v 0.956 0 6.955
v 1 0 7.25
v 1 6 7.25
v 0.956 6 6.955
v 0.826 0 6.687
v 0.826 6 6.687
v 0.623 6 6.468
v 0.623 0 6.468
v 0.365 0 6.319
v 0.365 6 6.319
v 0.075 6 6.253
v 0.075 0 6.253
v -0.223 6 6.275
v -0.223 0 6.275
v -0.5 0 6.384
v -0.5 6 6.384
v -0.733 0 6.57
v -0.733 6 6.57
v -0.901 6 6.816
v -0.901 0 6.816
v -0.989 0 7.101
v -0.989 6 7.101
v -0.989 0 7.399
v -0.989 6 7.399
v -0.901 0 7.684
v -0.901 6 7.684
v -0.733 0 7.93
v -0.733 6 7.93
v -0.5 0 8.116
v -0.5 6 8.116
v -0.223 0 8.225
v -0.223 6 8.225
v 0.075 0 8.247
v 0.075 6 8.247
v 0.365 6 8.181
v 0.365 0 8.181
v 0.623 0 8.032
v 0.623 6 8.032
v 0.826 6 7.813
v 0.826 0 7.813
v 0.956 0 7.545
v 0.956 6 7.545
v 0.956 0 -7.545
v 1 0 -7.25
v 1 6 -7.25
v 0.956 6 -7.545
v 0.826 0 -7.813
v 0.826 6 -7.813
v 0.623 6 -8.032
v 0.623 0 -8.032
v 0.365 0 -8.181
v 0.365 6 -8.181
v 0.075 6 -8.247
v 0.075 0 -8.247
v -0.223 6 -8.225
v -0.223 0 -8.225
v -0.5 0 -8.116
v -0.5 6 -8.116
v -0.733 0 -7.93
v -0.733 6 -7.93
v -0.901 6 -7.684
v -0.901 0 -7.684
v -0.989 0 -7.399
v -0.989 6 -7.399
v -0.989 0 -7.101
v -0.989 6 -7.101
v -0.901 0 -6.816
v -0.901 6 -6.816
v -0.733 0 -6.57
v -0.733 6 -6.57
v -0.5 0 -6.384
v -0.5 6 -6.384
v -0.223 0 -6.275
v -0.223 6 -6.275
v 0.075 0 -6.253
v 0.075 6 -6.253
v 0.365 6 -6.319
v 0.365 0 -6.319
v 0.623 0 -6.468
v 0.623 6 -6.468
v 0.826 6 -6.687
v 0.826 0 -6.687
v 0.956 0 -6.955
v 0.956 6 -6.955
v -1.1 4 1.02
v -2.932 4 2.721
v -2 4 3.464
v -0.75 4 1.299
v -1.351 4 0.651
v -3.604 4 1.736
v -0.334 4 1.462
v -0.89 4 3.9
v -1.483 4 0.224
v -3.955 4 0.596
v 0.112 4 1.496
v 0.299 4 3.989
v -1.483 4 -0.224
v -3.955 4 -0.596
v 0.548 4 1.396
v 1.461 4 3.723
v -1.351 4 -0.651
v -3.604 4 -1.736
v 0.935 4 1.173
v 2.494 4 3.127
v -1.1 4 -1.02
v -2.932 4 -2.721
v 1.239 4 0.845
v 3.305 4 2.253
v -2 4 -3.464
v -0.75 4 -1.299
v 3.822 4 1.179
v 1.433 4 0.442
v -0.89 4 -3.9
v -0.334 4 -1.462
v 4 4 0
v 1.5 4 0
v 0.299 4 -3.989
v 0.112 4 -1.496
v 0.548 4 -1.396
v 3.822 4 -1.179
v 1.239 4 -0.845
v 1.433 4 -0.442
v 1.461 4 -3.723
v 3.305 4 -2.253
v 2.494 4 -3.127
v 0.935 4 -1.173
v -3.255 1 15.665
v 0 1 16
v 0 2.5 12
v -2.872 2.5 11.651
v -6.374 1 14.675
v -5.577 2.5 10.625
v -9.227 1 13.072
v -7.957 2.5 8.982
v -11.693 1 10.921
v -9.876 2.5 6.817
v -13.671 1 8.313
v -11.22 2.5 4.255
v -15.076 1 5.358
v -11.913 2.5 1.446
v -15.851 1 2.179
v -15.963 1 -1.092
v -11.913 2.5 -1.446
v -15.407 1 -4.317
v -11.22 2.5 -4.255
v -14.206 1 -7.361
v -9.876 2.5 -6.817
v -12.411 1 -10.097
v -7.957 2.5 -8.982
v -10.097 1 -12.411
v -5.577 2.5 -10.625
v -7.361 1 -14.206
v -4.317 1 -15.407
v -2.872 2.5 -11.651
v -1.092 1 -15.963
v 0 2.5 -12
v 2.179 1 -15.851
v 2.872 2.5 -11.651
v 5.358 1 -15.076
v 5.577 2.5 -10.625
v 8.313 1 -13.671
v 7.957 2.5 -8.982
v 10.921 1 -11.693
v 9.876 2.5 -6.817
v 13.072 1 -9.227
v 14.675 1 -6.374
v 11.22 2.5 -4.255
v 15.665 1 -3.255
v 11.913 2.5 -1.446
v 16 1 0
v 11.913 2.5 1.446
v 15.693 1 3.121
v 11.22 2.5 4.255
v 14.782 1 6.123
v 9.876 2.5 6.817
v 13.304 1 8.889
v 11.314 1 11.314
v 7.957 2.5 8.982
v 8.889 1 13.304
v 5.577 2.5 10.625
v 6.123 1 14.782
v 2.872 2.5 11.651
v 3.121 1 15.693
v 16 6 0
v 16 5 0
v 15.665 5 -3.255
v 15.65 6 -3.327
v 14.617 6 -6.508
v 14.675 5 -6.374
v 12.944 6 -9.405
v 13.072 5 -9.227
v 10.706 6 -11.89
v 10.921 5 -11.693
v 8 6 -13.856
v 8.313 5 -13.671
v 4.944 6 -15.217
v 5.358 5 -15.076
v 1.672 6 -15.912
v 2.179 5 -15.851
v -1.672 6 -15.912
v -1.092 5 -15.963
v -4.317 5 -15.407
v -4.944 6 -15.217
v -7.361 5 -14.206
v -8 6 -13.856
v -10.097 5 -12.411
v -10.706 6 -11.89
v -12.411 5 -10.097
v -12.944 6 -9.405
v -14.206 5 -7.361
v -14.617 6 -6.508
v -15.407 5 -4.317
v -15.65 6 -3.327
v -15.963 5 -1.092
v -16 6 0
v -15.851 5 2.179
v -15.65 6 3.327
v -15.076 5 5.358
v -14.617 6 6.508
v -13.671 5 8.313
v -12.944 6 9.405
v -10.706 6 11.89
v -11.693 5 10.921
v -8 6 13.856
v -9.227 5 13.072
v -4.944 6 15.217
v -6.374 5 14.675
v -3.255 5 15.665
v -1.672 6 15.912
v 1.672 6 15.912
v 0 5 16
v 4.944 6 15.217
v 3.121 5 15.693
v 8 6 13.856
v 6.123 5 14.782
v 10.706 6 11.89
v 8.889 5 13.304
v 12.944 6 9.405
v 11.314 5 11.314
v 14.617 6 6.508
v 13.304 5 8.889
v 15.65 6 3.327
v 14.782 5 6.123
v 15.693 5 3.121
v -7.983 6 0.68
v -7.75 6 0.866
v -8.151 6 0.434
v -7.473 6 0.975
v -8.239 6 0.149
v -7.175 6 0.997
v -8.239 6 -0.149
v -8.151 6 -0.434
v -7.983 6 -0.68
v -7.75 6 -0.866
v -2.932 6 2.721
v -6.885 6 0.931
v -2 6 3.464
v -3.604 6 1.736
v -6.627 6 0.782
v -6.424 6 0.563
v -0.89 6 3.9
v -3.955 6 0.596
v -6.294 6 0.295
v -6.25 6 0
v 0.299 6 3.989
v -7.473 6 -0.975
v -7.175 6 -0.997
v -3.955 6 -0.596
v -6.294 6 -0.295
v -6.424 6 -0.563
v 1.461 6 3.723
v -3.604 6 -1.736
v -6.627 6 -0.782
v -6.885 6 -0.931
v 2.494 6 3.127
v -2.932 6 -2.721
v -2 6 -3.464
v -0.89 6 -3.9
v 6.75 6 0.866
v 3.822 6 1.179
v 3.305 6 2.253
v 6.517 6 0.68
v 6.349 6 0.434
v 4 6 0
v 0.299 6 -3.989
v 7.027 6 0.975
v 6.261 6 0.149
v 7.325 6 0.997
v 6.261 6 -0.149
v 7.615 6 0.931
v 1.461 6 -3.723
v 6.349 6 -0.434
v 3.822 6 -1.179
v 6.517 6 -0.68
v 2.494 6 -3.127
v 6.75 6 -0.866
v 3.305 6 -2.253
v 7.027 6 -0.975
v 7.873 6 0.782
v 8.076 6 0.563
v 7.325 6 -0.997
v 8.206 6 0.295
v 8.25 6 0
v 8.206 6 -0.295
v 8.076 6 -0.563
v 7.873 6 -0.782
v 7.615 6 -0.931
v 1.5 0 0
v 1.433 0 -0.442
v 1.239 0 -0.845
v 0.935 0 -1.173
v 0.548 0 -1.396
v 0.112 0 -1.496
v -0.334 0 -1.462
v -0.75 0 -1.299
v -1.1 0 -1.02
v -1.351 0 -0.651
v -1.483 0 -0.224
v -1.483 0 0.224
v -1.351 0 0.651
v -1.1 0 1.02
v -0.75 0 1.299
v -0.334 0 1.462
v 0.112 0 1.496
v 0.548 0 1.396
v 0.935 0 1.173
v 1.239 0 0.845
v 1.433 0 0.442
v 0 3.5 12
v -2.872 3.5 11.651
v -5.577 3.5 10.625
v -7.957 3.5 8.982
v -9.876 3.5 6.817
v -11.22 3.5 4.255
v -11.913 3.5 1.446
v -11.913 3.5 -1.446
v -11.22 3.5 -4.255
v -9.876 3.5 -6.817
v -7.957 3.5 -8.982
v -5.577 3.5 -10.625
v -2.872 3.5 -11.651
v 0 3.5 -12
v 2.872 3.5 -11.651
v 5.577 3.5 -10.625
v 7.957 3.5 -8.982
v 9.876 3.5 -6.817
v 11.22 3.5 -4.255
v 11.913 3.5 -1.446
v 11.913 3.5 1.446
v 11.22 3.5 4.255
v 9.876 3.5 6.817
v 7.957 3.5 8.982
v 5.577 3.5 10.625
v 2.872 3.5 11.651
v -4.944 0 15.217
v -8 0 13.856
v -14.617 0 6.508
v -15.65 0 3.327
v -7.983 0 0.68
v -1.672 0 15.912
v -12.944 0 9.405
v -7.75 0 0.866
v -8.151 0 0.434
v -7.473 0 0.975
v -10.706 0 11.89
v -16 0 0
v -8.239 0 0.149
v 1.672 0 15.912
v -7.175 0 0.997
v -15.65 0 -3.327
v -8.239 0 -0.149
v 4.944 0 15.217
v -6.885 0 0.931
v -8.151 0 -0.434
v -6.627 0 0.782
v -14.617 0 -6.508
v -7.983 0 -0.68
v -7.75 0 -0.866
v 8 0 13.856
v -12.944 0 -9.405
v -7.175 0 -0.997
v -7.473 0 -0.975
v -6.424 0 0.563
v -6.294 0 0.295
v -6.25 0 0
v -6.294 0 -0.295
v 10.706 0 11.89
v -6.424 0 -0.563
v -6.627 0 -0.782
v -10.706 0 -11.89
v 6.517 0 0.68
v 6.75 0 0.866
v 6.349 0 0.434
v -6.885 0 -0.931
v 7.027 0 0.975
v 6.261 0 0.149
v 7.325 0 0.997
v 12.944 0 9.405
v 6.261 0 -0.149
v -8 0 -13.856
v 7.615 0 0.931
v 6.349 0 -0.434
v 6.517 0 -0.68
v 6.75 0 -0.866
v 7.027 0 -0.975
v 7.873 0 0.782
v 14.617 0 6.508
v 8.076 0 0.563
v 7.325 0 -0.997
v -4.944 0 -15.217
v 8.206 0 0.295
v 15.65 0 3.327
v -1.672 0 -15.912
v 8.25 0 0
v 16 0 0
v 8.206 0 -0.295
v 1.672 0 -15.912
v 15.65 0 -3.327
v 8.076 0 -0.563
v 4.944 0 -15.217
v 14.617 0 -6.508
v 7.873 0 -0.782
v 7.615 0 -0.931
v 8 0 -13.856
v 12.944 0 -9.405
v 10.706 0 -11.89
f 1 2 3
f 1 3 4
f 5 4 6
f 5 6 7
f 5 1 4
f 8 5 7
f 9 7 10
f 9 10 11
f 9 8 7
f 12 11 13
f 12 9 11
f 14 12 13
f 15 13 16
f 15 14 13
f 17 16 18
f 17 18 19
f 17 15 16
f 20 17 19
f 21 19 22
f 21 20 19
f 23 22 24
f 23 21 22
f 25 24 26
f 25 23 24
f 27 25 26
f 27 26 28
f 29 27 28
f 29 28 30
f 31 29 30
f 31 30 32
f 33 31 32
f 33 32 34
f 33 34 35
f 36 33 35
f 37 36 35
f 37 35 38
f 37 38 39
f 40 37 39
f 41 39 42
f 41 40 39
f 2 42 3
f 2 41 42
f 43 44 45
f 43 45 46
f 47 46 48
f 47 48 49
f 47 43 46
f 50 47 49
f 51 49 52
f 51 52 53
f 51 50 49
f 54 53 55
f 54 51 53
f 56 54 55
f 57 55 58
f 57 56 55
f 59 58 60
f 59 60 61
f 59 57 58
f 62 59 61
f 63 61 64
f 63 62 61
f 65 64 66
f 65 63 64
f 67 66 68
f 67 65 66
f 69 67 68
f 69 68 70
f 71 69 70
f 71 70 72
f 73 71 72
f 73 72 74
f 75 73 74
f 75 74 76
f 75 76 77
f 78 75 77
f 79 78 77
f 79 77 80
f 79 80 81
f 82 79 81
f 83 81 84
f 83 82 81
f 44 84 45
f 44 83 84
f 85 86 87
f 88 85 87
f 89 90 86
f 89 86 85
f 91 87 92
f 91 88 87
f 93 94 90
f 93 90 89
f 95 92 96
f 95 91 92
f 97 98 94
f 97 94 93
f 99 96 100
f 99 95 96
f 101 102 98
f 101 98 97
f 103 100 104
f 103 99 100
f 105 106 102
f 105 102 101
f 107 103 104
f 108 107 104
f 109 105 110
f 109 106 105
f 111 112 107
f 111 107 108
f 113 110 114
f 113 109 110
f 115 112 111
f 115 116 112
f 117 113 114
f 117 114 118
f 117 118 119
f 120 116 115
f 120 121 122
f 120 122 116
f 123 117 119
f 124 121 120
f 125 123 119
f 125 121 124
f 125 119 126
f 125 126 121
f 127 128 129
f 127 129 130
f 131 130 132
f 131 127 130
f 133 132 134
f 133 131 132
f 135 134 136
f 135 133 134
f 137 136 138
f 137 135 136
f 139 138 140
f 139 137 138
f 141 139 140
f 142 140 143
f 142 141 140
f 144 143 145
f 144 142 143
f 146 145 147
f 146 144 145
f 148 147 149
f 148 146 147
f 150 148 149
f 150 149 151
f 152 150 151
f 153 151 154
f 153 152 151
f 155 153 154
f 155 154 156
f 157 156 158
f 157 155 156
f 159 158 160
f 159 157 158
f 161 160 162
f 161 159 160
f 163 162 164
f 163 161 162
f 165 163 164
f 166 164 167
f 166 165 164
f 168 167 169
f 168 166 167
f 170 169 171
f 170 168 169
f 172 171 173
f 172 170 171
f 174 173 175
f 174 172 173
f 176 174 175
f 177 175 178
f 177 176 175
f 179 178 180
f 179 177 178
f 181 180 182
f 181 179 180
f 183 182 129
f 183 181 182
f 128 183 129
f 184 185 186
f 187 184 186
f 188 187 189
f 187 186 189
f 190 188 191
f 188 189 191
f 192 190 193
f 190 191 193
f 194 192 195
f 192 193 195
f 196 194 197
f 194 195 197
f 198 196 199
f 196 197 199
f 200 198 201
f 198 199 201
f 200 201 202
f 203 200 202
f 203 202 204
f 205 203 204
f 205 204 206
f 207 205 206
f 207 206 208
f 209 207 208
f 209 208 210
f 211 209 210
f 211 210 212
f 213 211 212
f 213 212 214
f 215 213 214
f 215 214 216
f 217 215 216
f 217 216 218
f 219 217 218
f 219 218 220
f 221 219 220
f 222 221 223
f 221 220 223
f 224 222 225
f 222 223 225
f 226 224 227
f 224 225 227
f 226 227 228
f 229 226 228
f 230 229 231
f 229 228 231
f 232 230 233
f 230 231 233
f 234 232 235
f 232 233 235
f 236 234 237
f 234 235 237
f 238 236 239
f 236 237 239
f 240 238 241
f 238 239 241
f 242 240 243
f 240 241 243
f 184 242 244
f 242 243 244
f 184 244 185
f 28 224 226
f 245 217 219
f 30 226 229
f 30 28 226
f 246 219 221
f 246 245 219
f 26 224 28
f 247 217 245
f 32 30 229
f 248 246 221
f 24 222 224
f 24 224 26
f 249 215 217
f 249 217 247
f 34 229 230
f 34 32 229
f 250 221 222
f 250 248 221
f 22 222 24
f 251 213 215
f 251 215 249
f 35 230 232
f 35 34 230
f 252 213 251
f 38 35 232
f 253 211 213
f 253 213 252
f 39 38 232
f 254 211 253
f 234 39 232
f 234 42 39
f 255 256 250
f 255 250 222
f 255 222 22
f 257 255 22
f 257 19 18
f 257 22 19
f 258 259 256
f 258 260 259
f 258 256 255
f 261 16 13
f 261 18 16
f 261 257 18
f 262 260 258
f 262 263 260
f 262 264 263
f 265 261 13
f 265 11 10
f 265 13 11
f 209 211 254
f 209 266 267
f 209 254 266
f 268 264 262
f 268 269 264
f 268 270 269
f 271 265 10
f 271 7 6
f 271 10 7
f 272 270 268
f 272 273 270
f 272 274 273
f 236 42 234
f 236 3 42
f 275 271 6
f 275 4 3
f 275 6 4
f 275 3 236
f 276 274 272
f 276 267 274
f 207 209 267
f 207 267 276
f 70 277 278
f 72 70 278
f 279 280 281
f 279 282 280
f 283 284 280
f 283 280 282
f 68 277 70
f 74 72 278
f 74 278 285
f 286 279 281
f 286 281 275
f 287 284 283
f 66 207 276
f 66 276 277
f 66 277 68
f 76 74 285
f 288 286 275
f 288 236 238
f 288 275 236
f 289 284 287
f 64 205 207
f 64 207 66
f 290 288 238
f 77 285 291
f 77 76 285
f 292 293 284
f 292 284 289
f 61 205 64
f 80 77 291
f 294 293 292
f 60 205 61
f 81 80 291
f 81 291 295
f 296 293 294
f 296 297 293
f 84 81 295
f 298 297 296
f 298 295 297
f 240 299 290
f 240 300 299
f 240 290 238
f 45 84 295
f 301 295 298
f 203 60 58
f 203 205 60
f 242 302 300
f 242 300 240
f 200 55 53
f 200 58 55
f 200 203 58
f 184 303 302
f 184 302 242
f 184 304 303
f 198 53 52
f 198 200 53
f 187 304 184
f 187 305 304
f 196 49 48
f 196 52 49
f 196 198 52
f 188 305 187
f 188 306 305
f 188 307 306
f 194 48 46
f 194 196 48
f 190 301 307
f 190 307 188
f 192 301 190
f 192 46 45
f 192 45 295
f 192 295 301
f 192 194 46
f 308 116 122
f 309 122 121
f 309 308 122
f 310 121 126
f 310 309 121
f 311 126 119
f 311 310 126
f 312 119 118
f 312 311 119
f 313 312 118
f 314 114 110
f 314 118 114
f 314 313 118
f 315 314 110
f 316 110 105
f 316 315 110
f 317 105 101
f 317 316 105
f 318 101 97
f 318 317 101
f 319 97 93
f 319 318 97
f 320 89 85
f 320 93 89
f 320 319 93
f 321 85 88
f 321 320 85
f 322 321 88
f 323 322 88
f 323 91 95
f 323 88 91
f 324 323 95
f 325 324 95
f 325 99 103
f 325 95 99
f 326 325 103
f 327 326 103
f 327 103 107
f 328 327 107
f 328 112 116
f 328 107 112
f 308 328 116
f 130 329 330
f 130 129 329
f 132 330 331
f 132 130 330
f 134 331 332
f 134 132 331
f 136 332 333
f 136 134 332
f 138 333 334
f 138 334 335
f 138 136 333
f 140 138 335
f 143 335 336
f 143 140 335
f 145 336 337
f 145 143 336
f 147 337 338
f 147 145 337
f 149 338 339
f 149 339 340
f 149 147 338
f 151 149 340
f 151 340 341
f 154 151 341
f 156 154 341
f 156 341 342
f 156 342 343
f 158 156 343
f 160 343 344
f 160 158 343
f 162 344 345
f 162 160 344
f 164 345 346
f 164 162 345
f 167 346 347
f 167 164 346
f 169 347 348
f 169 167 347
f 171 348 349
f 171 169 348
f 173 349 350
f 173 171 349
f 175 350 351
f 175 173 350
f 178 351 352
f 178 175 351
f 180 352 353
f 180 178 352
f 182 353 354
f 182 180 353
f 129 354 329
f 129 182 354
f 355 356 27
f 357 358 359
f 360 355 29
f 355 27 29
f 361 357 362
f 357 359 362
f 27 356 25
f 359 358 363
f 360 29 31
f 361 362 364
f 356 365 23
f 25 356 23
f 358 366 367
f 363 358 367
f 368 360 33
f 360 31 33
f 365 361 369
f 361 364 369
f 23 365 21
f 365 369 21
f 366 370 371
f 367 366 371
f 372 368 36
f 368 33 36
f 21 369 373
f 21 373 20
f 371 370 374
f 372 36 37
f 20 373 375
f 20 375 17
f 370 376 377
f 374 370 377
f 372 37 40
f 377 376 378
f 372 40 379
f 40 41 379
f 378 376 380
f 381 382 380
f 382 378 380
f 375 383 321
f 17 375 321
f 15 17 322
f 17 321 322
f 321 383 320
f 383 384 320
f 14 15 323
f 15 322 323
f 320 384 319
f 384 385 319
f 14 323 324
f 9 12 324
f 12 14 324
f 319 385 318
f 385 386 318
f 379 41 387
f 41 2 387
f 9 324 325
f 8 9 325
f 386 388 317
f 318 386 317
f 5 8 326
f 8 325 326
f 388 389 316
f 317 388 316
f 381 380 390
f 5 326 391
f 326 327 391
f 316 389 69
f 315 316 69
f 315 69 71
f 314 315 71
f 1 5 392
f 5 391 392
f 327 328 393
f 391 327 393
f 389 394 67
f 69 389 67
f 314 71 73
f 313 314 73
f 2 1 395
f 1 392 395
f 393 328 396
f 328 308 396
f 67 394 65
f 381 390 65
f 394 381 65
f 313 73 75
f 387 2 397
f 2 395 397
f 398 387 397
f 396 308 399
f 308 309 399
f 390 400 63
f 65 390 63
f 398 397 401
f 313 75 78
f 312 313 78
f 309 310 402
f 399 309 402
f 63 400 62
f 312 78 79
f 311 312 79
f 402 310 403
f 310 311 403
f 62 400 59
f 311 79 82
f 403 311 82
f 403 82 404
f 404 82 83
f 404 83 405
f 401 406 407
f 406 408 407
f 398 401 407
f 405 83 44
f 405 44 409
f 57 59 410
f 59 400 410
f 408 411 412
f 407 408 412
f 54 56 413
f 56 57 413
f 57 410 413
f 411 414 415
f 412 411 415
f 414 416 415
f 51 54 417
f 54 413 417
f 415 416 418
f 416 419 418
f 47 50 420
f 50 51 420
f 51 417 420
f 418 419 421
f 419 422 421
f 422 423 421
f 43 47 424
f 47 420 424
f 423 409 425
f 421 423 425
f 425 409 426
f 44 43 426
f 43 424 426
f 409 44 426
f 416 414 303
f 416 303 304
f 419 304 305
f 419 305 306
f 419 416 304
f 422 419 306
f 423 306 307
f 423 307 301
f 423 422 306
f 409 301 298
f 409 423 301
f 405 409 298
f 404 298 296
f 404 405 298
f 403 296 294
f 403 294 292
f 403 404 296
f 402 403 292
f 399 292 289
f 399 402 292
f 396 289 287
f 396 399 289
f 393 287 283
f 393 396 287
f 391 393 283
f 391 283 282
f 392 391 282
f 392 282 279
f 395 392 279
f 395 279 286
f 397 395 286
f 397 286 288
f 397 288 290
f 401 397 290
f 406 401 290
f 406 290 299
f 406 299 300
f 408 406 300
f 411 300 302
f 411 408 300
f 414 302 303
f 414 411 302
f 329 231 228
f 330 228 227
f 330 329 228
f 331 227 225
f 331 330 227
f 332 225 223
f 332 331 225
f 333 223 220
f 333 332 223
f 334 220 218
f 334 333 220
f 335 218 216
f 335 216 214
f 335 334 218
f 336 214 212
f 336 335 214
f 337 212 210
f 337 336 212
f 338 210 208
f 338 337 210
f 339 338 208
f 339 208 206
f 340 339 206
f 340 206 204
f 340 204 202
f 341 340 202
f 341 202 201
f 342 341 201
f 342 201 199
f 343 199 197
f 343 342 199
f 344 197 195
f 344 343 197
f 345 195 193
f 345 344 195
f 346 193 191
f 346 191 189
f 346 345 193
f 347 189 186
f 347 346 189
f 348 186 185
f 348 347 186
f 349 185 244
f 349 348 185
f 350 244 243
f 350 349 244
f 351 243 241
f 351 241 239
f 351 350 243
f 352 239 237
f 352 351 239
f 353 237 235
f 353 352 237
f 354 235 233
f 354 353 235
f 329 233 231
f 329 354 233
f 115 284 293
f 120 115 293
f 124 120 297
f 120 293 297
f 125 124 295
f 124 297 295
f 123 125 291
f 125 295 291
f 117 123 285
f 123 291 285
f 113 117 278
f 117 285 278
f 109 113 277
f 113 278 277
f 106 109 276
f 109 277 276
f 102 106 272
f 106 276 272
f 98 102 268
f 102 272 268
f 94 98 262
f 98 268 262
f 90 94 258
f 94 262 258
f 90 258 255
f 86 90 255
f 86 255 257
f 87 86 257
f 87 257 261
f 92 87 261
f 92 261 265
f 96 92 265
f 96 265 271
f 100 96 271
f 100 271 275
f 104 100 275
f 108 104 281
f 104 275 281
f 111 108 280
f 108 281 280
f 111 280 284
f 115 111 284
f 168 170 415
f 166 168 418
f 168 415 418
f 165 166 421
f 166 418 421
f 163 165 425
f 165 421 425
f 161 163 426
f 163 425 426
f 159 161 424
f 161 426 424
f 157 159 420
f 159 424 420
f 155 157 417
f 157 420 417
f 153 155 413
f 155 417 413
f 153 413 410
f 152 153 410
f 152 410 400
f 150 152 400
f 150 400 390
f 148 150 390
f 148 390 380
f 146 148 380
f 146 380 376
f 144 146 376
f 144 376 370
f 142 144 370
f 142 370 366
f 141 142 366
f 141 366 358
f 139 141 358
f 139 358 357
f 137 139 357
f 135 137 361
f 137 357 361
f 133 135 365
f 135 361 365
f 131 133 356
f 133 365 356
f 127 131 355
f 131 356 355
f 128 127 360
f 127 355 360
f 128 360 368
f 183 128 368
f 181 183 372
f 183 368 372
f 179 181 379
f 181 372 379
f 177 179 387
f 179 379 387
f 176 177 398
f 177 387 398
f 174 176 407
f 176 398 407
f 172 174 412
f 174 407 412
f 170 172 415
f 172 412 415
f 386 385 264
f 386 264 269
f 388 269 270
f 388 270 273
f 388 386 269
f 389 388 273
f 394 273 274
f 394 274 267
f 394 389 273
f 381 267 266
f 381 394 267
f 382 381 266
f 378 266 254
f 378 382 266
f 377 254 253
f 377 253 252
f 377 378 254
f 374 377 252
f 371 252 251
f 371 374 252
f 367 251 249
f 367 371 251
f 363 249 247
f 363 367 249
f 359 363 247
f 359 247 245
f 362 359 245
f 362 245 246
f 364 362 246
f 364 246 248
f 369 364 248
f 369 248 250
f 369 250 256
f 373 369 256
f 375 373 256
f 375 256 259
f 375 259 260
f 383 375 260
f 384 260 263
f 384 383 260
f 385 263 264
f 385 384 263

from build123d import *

# Parameters (mm, degrees)
SKETCH1_R           = 16
SKETCH1_R_2         = 1
SKETCH1_R_3         = 1.5
BOSS_EXTRUDE1_DEPTH = 6
SKETCH2_R           = 4
CUT_EXTRUDE1_DEPTH  = 2


with BuildPart() as part:
    # Sketch1 → Boss-Extrude1 (new body)
    with BuildSketch(Plane(origin=(0, 0, 0), x_dir=(1, 0, 0), z_dir=(0, 1, 0))):
        Circle(SKETCH1_R)
        with Locations((0, 7.25)):
            Circle(SKETCH1_R_2, mode=Mode.SUBTRACT)
        with Locations((7.25, 0)):
            Circle(SKETCH1_R_2, mode=Mode.SUBTRACT)
        with Locations((0, -7.25)):
            Circle(SKETCH1_R_2, mode=Mode.SUBTRACT)
        with Locations((-7.25, 0)):
            Circle(SKETCH1_R_2, mode=Mode.SUBTRACT)
        Circle(SKETCH1_R_3, mode=Mode.SUBTRACT)
    extrude(amount=BOSS_EXTRUDE1_DEPTH)

    # Sketch2 → Cut-Extrude1 (cut)
    with BuildSketch(Plane(origin=(0, 6, 0), x_dir=(1, 0, 0), z_dir=(0, 1, 0))):
        Circle(SKETCH2_R)
    extrude(amount=-CUT_EXTRUDE1_DEPTH, mode=Mode.SUBTRACT)

    # Sketch3 → Cut-Revolve1 (revolve, cut)
    with BuildSketch(Plane(origin=(0, 0, 0), x_dir=(0, 0, -1), z_dir=(1, 0, 0))):
        Polygon((-16, 5), (-12, 3.5), (-12, 2.5), (-16, 1), align=None)
    revolve(axis=Axis((0, 6, 0), (0, -1, 0)), mode=Mode.SUBTRACT)


solid = part.part
